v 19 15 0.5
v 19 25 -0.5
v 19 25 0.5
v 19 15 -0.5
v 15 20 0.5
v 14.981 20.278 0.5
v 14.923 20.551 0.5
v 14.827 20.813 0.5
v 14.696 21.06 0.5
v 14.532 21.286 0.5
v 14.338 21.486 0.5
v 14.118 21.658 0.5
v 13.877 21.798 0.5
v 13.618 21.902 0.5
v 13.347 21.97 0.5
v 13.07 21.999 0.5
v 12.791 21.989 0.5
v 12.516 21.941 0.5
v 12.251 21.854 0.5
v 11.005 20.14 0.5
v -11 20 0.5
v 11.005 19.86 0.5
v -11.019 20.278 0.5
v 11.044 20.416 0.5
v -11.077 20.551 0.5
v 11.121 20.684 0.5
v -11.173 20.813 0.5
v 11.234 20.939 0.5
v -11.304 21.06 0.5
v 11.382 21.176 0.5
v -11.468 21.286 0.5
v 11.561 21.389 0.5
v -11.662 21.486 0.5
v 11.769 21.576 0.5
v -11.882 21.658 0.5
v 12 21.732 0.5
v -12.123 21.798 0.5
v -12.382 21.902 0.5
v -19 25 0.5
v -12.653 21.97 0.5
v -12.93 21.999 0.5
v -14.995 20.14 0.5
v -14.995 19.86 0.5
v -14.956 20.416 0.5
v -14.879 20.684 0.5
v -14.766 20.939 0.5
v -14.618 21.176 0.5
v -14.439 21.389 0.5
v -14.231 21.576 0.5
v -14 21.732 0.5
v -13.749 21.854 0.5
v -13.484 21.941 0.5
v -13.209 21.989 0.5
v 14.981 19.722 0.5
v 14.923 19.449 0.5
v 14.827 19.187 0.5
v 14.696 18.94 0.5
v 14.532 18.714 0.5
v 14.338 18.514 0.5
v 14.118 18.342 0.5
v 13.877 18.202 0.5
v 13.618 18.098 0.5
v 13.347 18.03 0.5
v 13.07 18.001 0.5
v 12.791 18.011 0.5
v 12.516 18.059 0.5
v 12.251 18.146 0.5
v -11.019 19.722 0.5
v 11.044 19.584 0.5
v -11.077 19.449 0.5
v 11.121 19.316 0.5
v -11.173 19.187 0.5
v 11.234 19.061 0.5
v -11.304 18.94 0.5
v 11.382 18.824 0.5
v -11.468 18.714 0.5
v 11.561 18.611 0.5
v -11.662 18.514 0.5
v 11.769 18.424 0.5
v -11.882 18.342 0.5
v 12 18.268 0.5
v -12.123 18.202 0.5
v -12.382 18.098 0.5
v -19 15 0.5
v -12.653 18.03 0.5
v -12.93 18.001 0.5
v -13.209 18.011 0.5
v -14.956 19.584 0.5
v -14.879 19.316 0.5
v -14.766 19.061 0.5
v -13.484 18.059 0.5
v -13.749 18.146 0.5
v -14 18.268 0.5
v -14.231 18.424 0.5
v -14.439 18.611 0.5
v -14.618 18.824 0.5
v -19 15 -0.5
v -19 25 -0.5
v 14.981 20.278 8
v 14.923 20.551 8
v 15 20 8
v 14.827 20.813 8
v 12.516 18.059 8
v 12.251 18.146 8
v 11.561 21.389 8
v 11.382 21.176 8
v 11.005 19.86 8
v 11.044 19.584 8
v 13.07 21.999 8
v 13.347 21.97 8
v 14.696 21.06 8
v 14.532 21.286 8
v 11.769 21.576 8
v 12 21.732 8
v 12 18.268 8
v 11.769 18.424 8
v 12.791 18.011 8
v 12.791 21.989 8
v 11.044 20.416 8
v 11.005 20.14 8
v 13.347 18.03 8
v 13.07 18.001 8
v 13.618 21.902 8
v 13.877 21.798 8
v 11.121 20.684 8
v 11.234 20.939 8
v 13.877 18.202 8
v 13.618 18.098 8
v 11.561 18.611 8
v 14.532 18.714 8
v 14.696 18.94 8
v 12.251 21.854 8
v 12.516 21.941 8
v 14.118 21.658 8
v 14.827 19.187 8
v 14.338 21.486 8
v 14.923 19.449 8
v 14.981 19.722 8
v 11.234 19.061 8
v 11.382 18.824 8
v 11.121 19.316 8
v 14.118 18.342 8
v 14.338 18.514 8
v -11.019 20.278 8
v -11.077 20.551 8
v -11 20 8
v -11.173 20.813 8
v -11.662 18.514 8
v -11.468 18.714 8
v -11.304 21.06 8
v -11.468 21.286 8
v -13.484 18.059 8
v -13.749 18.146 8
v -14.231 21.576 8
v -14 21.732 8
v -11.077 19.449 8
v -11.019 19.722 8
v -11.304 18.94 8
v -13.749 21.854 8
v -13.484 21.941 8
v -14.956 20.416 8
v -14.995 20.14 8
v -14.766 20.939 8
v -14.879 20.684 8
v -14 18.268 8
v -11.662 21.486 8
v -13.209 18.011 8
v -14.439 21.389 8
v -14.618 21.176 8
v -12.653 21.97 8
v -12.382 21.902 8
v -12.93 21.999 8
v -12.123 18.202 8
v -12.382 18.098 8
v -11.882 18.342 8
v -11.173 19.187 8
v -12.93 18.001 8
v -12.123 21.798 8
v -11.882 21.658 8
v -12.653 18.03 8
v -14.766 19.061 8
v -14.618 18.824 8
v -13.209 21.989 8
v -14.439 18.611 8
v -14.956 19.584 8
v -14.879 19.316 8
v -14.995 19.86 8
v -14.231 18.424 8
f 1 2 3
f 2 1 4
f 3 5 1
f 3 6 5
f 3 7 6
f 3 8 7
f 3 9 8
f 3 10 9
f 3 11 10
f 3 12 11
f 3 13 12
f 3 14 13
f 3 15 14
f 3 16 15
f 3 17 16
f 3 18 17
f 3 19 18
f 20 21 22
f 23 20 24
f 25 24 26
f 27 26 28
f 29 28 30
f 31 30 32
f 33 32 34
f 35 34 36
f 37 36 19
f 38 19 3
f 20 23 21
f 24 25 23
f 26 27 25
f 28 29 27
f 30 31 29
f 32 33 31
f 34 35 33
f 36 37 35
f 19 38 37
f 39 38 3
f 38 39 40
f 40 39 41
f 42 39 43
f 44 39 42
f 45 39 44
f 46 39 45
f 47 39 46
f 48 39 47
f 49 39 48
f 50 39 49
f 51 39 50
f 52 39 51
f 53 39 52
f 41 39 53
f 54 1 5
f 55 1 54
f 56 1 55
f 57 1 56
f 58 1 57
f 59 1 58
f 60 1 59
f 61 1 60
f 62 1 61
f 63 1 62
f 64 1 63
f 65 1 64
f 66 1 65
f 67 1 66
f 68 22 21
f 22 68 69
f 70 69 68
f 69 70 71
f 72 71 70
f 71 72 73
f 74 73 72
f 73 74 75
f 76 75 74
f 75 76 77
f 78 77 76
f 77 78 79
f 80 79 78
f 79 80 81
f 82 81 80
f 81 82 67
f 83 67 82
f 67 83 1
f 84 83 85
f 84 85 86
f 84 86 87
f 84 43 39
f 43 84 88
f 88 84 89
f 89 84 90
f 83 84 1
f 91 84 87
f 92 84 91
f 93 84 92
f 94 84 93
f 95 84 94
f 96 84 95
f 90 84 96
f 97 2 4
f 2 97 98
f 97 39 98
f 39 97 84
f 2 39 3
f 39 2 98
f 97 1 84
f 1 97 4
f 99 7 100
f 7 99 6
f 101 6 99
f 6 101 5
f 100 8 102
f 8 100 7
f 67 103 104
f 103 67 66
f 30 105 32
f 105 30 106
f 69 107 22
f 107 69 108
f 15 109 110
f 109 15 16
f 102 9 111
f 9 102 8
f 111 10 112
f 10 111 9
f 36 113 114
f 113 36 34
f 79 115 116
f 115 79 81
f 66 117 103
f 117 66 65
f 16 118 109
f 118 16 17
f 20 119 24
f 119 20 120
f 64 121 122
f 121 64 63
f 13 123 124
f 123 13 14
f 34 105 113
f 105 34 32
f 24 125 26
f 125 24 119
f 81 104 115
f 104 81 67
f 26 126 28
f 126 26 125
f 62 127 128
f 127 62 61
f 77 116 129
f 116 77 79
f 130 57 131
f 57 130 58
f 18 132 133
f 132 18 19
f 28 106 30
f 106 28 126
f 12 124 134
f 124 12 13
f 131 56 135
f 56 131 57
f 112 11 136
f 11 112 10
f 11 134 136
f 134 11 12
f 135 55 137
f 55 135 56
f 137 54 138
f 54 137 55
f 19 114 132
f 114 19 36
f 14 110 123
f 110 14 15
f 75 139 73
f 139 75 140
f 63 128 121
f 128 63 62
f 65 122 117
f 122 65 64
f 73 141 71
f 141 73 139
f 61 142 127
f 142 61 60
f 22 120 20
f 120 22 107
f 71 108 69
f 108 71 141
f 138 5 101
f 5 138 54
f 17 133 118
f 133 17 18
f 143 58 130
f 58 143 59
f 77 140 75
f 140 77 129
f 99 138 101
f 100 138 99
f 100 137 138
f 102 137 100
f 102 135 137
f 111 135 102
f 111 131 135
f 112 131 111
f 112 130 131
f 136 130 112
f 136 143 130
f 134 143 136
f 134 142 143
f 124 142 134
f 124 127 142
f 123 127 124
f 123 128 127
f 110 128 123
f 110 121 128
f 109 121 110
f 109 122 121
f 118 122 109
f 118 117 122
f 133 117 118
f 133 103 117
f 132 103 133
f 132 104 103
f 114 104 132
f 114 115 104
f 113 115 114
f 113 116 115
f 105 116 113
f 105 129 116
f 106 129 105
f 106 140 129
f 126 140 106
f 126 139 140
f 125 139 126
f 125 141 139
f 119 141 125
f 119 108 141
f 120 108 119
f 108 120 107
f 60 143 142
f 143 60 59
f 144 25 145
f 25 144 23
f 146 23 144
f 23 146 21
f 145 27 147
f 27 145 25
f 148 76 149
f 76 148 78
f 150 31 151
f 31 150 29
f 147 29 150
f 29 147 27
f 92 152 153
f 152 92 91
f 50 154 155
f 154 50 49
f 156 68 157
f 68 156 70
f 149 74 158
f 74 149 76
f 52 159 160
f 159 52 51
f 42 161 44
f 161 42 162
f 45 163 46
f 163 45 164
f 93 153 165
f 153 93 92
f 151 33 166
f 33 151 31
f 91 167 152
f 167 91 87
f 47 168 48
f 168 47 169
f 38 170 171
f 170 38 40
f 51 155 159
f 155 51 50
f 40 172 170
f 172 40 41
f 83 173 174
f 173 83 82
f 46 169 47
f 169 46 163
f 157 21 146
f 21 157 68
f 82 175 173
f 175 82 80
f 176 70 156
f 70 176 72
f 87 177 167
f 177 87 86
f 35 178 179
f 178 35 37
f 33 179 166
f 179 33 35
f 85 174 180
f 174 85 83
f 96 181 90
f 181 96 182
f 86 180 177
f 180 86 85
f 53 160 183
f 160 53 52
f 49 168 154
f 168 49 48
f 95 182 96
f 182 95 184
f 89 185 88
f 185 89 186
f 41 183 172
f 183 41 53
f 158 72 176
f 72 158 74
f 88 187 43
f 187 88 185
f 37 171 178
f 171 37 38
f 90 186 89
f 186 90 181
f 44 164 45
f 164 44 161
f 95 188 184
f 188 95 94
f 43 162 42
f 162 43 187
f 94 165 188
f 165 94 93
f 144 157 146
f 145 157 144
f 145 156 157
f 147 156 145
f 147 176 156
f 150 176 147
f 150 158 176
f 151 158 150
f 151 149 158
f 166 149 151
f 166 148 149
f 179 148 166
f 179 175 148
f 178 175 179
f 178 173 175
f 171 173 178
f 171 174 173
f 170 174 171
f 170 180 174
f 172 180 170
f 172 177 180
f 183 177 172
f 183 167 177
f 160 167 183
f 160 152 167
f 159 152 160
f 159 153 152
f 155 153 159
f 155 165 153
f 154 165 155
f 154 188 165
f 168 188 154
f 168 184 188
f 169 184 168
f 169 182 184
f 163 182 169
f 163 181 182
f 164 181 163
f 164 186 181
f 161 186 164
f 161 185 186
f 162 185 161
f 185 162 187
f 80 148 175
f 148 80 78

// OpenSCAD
/*
translate([0,0,0]) {
  cube([38,10,1.5], center=true);
  translate([13, 0, 0]) cylinder(h=20, r1=2.5, r2=.5, $fn=45);
  translate([-13, 0, 0]) cylinder(h=20, r1=2.5, r2=.5, $fn=45);
}
*/

translate([0,20,0]) {
  cube([38,10,1], center=true);
  translate([13, 0, 0]) cylinder(h=8, r=2, $fn=45);
  translate([-13, 0, 0]) cylinder(h=8, r=2, $fn=45);
}
